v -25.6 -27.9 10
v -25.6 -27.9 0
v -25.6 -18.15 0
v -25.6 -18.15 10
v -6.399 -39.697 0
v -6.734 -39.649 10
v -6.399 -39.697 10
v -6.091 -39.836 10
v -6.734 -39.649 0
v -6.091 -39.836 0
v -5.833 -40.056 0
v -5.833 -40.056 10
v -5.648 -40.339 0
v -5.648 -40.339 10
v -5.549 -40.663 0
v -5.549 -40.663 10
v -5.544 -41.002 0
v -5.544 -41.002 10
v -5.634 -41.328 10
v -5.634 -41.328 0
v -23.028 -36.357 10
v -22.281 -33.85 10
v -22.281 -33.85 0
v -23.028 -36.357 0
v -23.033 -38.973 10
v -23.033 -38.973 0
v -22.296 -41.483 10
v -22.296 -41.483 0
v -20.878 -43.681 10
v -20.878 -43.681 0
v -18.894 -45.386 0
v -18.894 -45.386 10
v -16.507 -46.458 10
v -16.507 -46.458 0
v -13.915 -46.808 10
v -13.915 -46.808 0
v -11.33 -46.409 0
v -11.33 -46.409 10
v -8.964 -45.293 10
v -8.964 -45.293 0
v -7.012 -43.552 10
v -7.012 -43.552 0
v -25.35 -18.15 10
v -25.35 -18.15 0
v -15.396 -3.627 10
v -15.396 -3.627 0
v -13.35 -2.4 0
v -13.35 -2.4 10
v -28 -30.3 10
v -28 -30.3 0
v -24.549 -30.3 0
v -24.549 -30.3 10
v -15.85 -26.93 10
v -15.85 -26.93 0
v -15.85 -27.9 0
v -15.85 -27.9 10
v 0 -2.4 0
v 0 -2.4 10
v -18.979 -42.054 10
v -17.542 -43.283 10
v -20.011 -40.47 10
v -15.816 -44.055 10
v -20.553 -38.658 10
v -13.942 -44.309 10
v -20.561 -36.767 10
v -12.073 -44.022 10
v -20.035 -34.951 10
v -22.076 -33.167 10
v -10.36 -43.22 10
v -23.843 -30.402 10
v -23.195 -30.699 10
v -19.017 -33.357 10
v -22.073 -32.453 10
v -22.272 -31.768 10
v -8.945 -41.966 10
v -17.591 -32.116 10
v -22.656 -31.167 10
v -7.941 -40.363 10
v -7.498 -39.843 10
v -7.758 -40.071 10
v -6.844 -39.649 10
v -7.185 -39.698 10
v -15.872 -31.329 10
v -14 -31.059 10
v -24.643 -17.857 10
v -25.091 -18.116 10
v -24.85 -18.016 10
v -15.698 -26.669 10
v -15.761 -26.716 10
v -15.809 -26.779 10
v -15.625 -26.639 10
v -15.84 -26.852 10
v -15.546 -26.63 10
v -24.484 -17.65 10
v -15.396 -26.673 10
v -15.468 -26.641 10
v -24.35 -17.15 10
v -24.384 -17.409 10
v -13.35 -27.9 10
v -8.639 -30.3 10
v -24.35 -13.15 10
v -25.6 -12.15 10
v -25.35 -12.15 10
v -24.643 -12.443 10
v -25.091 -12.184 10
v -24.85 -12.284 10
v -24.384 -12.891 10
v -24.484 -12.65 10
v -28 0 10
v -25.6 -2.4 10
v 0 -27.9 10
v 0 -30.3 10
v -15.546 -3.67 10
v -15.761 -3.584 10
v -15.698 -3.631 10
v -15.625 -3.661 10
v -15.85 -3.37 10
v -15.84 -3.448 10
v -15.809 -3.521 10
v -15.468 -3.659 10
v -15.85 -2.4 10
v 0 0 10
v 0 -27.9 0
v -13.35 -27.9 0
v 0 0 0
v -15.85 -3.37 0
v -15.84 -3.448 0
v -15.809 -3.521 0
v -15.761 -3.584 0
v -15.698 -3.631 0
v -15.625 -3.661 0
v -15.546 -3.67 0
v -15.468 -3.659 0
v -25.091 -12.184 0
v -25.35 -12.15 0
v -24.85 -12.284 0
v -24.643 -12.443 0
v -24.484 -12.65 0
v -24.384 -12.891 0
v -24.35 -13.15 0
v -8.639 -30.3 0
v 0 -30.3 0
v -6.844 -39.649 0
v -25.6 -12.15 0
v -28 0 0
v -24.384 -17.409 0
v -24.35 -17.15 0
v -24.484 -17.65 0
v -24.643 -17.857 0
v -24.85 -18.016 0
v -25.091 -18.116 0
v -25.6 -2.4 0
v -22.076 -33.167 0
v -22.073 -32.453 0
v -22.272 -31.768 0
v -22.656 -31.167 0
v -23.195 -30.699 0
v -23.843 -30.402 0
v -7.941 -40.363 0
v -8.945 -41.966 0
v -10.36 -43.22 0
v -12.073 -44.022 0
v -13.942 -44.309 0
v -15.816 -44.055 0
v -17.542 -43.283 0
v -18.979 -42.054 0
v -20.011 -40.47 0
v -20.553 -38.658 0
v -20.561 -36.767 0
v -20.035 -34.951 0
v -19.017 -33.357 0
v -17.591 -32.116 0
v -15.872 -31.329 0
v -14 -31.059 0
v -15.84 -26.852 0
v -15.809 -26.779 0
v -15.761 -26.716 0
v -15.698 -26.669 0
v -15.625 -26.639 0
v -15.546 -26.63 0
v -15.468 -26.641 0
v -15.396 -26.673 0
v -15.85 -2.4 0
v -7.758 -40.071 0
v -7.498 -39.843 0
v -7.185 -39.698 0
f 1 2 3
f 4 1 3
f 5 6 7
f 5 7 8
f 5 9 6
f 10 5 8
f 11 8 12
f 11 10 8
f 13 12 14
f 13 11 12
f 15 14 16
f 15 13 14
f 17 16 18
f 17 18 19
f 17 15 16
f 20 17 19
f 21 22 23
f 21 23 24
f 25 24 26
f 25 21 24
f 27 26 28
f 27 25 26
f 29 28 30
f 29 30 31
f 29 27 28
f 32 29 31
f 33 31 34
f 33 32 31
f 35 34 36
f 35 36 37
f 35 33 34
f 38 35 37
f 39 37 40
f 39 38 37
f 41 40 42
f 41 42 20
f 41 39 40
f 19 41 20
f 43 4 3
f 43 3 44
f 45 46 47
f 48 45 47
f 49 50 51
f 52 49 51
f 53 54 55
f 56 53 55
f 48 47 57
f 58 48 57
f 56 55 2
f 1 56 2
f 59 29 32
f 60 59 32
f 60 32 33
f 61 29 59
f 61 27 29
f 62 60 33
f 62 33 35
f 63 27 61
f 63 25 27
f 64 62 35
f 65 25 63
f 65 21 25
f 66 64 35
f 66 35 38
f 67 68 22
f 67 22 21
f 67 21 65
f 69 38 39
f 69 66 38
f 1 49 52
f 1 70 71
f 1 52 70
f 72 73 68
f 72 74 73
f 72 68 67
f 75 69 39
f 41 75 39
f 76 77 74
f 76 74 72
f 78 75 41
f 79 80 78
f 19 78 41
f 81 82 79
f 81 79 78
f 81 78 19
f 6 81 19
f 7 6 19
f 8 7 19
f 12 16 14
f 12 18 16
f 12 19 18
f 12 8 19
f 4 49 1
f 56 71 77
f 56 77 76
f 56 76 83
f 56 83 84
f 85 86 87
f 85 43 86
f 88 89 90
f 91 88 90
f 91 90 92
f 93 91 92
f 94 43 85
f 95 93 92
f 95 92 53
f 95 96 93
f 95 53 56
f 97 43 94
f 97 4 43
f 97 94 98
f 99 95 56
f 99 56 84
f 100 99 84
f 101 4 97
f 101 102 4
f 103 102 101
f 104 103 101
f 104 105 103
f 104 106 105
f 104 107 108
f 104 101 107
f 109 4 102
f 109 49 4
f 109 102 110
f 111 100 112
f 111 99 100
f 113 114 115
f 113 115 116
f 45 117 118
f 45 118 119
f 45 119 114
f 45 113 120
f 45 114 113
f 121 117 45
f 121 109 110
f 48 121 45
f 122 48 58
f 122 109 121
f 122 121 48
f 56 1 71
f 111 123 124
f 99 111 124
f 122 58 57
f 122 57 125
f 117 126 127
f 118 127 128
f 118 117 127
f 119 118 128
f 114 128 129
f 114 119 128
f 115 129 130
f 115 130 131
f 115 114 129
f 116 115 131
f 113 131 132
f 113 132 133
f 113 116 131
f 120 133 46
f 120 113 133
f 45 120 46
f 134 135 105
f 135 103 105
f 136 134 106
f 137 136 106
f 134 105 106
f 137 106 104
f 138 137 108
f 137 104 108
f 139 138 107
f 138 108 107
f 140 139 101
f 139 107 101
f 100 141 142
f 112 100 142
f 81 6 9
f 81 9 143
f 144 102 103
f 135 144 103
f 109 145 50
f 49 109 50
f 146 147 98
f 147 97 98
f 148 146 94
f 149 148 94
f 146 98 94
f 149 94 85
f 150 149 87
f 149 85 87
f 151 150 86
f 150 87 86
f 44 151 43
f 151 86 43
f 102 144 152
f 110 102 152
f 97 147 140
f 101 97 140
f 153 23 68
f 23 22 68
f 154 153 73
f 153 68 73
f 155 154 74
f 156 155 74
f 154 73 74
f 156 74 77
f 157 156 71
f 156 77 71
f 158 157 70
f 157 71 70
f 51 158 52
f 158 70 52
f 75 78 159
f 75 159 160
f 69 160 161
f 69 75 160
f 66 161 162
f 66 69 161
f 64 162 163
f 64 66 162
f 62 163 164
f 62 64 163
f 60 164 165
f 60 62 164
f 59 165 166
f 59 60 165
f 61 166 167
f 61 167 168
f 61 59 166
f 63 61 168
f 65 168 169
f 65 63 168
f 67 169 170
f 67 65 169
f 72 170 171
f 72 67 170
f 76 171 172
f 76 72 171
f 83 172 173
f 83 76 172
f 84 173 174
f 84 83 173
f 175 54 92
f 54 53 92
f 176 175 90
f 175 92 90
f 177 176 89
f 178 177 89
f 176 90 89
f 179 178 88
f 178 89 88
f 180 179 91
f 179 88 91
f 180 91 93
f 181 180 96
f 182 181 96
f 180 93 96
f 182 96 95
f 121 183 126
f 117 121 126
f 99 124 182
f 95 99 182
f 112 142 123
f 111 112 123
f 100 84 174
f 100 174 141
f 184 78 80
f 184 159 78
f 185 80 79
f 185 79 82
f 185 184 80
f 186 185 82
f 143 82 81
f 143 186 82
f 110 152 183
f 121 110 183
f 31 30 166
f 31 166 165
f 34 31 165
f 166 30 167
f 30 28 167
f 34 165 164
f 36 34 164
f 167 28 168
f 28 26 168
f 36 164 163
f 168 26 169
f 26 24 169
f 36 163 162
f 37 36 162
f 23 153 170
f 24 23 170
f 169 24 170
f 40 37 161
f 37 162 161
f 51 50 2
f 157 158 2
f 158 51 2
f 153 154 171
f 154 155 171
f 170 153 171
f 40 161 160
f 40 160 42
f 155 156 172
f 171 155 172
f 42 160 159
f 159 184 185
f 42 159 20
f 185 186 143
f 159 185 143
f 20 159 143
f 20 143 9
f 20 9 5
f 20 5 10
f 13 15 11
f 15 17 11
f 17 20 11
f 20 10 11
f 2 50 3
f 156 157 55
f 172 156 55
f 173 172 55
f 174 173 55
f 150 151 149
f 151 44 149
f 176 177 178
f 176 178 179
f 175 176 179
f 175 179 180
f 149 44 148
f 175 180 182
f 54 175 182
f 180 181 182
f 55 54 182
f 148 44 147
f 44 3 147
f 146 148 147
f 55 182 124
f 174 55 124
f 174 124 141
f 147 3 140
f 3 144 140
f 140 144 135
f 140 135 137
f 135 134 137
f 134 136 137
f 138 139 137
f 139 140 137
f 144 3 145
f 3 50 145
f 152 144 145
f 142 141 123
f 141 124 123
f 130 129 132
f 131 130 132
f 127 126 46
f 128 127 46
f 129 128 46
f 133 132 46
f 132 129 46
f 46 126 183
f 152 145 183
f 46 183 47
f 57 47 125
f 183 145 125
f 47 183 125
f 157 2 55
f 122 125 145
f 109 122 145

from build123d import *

# Parameters (mm, degrees)
F0_W     = 1.25
F0_H     = 6
F1_DEPTH = 10
F3_DEPTH = 10
F4_R     = 1.2
F5_R     = 2.5
F6_R     = 1
F7_R     = 0.3


with BuildPart() as f1:
    # F0 (on Top) → F1 (new body)
    with BuildSketch(Plane.XY):
        Polygon((0, -2.4), (0, 0), (-28, 0), (-28, -30.3), (0, -30.3), (0, -27.9), (-13.35, -27.9), (-15.85, -27.9), (-25.6, -27.9), (-25.6, -18.15), (-25.6, -12.15), (-25.6, -2.4), (-15.85, -2.4), (-13.35, -2.4), align=None)
        Polygon((-15.85, -3.9), (-13.35, -2.4), (-15.85, -2.4), align=None)
        Polygon((-15.85, -27.9), (-13.35, -27.9), (-15.85, -26.4), align=None)
        with Locations((-24.975, -15.15)):
            Rectangle(F0_W, F0_H)
    extrude(amount=F1_DEPTH)

    # F2 (on face) → F3 (join)
    with BuildSketch(Plane.XY.offset(10)):
        with BuildLine():
            ThreePointArc((-7.6731015896, -39.6488182922), (-19.3342450038, -41.6128057076), (-14, -31.0588802515))
            Line((-14, -31.0588802515), (-8.6386627198, -30.3))
            ThreePointArc((-8.6386627198, -30.3), (-22.5307966917, -40.9228820738), (-5.0890716816, -39.6488182922))
            Line((-5.0890716816, -39.6488182922), (-7.6731015896, -39.6488182922))
        make_face()
    extrude(amount=-F3_DEPTH)

    # F4
    f4_edges = [f1.edges().sort_by_distance(p)[0] for p in [
        (-7.673102, -39.648818, 5),
        (-5.089072, -39.648818, 5),
    ]]
    fillet(f4_edges, radius=F4_R)

    # F5
    f5_edges = [f1.edges().sort_by_distance(p)[0] for p in [
        (-19.361337, -30.3, 5),
    ]]
    fillet(f5_edges, radius=F5_R)

    # F6
    f6_edges = [f1.edges().sort_by_distance(p)[0] for p in [
        (-24.35, -12.15, 5),
        (-24.35, -18.15, 5),
    ]]
    fillet(f6_edges, radius=F6_R)

    # F7
    f7_edges = [f1.edges().sort_by_distance(p)[0] for p in [
        (-15.85, -3.9, 5),
        (-15.85, -26.4, 5),
    ]]
    fillet(f7_edges, radius=F7_R)


solid = f1.part
